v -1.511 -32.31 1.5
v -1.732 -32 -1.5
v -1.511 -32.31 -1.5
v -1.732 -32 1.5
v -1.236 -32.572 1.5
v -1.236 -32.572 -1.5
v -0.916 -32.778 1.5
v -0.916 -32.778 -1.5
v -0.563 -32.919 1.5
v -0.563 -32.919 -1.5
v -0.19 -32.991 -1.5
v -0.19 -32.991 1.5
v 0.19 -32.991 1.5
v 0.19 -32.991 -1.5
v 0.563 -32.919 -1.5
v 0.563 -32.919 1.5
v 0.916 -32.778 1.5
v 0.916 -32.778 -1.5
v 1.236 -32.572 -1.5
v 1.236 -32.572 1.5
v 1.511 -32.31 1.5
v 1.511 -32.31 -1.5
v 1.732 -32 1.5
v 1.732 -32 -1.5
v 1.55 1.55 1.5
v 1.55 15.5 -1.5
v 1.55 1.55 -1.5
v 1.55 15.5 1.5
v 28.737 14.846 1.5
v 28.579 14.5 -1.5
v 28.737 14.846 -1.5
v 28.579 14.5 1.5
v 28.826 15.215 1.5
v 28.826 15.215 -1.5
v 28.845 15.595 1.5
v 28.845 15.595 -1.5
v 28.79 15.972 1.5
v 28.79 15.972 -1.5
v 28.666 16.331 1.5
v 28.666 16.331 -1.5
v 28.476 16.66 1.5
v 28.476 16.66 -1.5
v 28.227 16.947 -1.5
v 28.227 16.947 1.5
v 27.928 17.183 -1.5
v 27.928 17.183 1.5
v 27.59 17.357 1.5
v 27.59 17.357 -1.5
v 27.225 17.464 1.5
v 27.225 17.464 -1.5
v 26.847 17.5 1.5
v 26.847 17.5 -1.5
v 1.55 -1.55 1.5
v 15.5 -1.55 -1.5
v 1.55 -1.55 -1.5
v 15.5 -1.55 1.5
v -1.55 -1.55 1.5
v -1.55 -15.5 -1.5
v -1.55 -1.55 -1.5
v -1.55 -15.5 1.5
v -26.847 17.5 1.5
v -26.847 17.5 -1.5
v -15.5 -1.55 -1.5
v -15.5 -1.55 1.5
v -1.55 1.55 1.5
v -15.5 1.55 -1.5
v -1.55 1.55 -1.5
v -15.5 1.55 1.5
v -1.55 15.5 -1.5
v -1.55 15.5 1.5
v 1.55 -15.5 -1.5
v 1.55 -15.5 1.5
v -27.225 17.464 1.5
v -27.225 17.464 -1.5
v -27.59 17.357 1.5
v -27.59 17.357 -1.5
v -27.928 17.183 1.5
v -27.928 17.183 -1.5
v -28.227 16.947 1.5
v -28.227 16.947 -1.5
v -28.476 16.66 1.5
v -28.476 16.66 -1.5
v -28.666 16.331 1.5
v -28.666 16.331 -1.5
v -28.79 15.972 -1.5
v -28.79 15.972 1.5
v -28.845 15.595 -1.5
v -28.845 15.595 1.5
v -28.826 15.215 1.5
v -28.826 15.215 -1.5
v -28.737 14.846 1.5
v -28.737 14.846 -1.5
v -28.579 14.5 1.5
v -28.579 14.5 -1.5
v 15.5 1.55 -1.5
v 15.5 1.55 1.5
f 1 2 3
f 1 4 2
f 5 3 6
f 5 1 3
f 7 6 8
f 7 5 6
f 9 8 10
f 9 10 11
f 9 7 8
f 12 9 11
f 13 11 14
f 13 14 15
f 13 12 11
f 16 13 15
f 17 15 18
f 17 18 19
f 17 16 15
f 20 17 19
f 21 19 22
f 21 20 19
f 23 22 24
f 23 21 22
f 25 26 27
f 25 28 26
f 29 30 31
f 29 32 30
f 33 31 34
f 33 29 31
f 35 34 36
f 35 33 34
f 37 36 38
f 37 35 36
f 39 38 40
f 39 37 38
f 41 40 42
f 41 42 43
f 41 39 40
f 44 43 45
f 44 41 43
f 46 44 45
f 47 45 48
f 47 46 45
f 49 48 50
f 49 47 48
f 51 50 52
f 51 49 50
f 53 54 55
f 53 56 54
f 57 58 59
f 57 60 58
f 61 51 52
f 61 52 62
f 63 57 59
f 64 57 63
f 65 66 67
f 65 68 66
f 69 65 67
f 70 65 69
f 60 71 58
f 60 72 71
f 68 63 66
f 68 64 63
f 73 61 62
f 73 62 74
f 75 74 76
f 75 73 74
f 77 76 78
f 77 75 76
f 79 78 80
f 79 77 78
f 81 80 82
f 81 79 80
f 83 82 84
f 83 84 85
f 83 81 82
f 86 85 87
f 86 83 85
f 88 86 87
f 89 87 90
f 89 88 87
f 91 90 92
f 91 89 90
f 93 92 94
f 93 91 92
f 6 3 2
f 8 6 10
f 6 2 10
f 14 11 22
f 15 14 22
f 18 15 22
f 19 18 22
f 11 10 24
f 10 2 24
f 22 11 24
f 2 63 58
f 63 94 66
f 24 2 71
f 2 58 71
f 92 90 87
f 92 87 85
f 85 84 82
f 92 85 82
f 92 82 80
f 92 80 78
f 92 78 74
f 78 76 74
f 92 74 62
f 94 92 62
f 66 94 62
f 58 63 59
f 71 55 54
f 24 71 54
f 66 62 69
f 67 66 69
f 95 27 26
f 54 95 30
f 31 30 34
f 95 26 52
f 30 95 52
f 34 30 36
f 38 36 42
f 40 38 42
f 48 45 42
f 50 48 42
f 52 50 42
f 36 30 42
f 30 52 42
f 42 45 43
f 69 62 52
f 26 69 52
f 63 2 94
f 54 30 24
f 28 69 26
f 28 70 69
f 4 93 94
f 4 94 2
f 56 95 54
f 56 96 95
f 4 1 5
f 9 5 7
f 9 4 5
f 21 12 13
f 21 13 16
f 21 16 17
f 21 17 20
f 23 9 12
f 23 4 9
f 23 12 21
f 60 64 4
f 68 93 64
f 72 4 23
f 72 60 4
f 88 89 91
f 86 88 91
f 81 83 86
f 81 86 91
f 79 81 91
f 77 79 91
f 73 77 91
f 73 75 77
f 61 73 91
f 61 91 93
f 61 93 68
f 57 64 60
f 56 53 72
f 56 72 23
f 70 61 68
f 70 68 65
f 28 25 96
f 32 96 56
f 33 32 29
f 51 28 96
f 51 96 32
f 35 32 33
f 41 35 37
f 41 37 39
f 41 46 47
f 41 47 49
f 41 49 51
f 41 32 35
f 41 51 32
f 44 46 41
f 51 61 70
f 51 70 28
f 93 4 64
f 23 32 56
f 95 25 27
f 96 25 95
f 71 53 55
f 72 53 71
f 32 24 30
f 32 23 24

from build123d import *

# Parameters (mm, degrees)
BOSS_EXTRUDE1_DEPTH = 1.5


with BuildPart() as part:
    # Sketch1 → Boss-Extrude1 (new body, symmetric)
    with BuildSketch(Plane.XY):
        with BuildLine():
            ThreePointArc((28.578838325, 14.5), (28.578838325, 16.5), (26.846787517, 17.5))
            Line((26.846787517, 17.5), (-26.846787517, 17.5))
            ThreePointArc((-26.846787517, 17.5), (-28.578838325, 16.5), (-28.578838325, 14.5))
            Line((-28.578838325, 14.5), (-1.732050808, -32))
            ThreePointArc((-1.732050808, -32), (0, -33), (1.732050808, -32))
            Line((1.732050808, -32), (28.578838325, 14.5))
        make_face()
        Polygon((-1.55, 1.55), (-1.55, 15.5), (1.55, 15.5), (1.55, 1.55), (15.5, 1.55), (15.5, -1.55), (1.55, -1.55), (1.55, -15.5), (-1.55, -15.5), (-1.55, -1.55), (-15.5, -1.55), (-15.5, 1.55), align=None, mode=Mode.SUBTRACT)
    extrude(amount=BOSS_EXTRUDE1_DEPTH, both=True)


solid = part.part
